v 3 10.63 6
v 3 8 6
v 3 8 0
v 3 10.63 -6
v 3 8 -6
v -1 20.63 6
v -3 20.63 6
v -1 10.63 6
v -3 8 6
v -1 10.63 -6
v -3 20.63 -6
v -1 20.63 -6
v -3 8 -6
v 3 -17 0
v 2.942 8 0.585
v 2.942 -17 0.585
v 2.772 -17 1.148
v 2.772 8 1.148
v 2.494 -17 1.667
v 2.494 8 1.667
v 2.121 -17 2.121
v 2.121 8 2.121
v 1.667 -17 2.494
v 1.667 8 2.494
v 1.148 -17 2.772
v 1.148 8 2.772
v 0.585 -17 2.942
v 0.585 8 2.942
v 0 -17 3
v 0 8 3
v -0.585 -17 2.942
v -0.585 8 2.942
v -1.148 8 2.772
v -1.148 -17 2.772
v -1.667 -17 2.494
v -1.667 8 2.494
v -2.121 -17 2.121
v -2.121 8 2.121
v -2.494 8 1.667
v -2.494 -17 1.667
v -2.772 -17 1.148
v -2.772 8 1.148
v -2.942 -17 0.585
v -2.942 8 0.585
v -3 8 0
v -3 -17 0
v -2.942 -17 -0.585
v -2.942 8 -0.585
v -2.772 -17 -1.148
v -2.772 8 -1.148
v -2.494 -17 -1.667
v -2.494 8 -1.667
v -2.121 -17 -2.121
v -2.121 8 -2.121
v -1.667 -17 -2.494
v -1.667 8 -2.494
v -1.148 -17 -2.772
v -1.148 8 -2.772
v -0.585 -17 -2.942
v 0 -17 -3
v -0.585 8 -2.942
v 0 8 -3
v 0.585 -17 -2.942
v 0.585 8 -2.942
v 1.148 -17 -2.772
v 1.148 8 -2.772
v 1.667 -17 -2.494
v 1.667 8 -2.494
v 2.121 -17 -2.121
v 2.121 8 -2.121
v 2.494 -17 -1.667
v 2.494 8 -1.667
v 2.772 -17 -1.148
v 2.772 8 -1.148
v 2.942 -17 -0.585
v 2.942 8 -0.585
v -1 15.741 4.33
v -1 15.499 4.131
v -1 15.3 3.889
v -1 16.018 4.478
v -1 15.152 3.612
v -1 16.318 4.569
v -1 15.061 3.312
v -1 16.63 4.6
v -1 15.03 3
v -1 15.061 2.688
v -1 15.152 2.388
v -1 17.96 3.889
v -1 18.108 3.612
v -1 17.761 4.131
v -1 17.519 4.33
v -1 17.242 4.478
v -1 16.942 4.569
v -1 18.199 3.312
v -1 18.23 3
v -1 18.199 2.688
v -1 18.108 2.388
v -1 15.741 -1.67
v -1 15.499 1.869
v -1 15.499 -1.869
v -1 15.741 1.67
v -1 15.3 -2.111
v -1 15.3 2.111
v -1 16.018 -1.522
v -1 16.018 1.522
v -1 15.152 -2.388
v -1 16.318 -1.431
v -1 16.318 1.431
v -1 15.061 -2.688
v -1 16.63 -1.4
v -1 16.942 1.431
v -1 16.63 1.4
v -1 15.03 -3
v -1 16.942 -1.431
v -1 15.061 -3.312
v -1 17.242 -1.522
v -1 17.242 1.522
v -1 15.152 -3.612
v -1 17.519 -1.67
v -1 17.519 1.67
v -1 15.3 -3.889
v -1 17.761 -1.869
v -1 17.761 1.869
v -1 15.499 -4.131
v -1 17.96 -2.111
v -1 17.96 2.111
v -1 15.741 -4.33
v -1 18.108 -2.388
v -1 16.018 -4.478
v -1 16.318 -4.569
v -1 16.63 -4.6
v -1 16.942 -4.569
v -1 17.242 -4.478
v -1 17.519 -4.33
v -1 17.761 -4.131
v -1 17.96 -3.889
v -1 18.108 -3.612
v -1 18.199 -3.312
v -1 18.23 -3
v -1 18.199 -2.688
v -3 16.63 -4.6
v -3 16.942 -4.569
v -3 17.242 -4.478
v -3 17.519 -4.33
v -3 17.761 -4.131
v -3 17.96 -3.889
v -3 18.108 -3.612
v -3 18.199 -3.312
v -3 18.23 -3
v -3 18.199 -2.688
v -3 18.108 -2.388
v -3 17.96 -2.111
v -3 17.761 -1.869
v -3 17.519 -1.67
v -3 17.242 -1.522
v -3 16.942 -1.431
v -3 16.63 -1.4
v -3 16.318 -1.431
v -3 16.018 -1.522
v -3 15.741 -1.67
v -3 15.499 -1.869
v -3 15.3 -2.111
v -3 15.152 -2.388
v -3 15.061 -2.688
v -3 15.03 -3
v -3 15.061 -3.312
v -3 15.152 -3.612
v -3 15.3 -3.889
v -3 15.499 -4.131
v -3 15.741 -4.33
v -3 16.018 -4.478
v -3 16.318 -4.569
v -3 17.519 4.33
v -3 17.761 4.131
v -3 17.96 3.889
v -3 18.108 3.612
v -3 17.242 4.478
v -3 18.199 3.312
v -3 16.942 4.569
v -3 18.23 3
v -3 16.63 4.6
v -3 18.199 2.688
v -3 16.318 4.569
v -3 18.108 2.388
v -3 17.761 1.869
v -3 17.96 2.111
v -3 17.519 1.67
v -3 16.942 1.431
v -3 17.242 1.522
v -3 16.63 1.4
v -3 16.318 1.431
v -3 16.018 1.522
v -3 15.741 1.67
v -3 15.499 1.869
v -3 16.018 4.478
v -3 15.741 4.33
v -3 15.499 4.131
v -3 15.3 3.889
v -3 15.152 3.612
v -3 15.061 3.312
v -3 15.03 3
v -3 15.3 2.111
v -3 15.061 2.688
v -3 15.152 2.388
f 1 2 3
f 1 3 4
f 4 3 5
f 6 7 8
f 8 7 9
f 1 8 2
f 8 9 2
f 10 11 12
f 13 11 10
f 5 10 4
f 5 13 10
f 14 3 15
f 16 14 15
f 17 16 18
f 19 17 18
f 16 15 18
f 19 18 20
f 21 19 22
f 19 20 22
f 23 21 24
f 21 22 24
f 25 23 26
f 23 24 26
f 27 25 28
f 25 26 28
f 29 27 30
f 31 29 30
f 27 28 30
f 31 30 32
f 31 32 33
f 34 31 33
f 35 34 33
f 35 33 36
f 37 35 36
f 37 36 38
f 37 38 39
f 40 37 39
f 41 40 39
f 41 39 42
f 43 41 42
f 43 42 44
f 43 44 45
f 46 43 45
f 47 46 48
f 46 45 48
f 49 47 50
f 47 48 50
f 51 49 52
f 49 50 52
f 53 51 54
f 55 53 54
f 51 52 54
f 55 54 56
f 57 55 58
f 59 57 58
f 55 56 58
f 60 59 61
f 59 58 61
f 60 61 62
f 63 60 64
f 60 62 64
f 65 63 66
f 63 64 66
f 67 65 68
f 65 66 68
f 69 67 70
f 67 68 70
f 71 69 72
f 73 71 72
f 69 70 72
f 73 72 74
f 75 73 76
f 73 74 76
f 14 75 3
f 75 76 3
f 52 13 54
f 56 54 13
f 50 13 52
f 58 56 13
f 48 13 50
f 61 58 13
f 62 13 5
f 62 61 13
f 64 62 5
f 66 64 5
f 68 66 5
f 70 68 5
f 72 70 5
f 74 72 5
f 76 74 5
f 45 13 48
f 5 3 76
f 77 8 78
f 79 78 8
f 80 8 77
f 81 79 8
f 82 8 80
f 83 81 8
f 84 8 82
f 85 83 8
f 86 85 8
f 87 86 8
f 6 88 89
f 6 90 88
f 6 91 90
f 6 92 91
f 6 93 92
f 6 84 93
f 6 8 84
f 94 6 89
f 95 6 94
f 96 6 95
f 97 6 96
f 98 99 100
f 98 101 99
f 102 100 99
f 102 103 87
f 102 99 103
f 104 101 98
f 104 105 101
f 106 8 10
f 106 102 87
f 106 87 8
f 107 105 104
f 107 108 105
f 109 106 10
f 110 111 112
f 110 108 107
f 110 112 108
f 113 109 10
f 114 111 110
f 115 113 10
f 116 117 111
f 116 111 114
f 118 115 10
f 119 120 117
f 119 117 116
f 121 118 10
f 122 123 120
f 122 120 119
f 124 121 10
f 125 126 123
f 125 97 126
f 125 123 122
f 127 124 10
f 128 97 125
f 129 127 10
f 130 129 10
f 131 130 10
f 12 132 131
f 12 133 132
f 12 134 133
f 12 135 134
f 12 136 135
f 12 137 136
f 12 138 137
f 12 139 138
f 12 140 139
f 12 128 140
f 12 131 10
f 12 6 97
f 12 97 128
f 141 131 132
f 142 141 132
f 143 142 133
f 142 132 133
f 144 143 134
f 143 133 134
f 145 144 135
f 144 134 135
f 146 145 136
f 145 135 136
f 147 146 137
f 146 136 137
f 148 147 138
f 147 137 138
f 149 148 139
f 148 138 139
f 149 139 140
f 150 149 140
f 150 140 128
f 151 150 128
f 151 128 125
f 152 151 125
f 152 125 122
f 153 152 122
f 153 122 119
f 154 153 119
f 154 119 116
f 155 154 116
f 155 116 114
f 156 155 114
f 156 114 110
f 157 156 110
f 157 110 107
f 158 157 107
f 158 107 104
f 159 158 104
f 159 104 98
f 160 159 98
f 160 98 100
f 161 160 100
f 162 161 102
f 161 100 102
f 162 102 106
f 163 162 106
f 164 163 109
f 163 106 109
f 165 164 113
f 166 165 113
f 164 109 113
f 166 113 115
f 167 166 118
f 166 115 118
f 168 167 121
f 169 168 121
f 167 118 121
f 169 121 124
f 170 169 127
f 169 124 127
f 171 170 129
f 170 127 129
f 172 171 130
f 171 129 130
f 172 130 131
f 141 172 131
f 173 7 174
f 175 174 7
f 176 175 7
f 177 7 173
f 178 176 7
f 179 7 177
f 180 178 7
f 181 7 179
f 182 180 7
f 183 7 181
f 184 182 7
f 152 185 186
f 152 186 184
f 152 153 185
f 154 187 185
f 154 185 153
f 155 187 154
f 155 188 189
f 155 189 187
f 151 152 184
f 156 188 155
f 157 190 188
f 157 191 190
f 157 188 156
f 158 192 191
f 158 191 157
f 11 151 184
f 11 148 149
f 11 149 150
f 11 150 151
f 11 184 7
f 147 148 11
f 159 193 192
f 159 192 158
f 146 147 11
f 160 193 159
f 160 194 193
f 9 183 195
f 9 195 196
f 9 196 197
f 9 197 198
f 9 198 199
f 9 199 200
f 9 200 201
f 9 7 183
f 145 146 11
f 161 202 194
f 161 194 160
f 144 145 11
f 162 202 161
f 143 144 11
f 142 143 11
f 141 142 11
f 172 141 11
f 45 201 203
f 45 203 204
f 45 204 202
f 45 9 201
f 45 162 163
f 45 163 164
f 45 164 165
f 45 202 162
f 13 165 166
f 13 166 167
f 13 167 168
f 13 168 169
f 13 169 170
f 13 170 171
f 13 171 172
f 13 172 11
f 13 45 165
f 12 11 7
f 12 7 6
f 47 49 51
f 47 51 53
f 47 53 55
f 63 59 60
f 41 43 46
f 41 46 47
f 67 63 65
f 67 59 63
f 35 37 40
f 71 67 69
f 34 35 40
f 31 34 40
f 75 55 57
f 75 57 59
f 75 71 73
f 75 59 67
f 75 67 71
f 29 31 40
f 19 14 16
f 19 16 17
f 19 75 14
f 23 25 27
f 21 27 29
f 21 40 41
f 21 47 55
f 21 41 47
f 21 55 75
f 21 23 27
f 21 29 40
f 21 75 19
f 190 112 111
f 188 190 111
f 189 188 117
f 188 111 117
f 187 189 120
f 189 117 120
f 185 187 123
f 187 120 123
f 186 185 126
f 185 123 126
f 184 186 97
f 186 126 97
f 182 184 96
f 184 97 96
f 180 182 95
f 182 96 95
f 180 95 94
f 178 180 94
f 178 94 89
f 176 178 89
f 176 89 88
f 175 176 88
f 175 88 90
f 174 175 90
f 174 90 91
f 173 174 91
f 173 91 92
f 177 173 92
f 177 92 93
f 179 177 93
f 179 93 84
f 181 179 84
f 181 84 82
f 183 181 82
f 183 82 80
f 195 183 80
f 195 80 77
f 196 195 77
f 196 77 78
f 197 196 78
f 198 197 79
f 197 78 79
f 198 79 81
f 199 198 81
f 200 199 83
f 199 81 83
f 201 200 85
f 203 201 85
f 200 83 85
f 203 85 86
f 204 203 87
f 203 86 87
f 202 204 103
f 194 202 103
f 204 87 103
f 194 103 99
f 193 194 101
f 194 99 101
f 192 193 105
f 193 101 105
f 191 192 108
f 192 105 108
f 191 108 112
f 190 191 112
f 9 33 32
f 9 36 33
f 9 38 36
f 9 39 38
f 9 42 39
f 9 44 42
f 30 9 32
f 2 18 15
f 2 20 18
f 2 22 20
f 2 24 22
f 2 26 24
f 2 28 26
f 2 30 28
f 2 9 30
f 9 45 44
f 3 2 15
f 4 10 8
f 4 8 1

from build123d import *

# Parameters (mm, degrees)
SKETCH_1_R          = 12.25
SKETCH_1_R_2        = 1.25
EXTRUDE_1_DEPTH     = 2
SKETCH_2_R          = 3
EXTRUDE_2_DEPTH     = 10.63
SKETCH_3_W          = 2
SKETCH_3_H          = 12
EXTRUDE_3_DEPTH     = 8
SKETCH_5_R          = 1.6
CUT_EXTRUDE_1_DEPTH = 10
SKETCH_6_W          = 6
SKETCH_6_H          = 12
EXTRUDE_4_DEPTH     = 10.63
SKETCH_7_W          = 4
SKETCH_7_H          = 12
CUT_EXTRUDE_2_DEPTH = 2
SKETCH_8_R          = 12.25
CUT_EXTRUDE_3_DEPTH = 8
SKETCH_9_R          = 3
EXTRUDE_5_DEPTH     = 25


with BuildPart() as part:
    # 草图1 → 凸台-拉伸1 (new body)
    with BuildSketch(Plane(origin=(0, 0, 0), x_dir=(1, 0, 0), z_dir=(0, 1, 0))):
        Circle(SKETCH_1_R)
        with Locations((8, 0)):
            Circle(SKETCH_1_R_2, mode=Mode.SUBTRACT)
        with Locations((0, -8)):
            Circle(SKETCH_1_R_2, mode=Mode.SUBTRACT)
        with Locations((-8, 0)):
            Circle(SKETCH_1_R_2, mode=Mode.SUBTRACT)
        with Locations((0, 8)):
            Circle(SKETCH_1_R_2, mode=Mode.SUBTRACT)
    extrude(amount=EXTRUDE_1_DEPTH)

    # 草图2 → 凸台-拉伸2 (add)
    with BuildSketch(Plane(origin=(0, 2, 0), x_dir=(1, 0, 0), z_dir=(0, 1, 0))):
        Circle(SKETCH_2_R)
    extrude(amount=EXTRUDE_2_DEPTH)

    # 草图3 → 凸台-拉伸3 (add)
    with BuildSketch(Plane(origin=(0, 12.63, 0), x_dir=(1, 0, 0), z_dir=(0, 1, 0))):
        with Locations((-2, 0)):
            Rectangle(SKETCH_3_W, SKETCH_3_H)
    extrude(amount=EXTRUDE_3_DEPTH)

    # 草图5 → 切除-拉伸1 (cut)
    with BuildSketch(Plane(origin=(-1, 0, 0), x_dir=(0, 0, -1), z_dir=(1, 0, 0))):
        with Locations((3, 16.63)):
            Circle(SKETCH_5_R)
        with Locations((-3, 16.63)):
            Circle(SKETCH_5_R)
    extrude(amount=-CUT_EXTRUDE_1_DEPTH, mode=Mode.SUBTRACT)

    # 草图6 → 凸台-拉伸4 (add)
    with BuildSketch(Plane(origin=(0, 2, 0), x_dir=(1, 0, 0), z_dir=(0, 1, 0))):
        Rectangle(SKETCH_6_W, SKETCH_6_H)
    extrude(amount=EXTRUDE_4_DEPTH)

    # 草图7 → 切除-拉伸2 (cut)
    with BuildSketch(Plane(origin=(0, 12.63, 0), x_dir=(1, 0, 0), z_dir=(0, 1, 0))):
        with Locations((1, 0)):
            Rectangle(SKETCH_7_W, SKETCH_7_H)
    extrude(amount=-CUT_EXTRUDE_2_DEPTH, mode=Mode.SUBTRACT)

    # 草图8 → 切除-拉伸3 (cut)
    with BuildSketch(Plane.XZ):
        Circle(SKETCH_8_R)
    extrude(amount=-CUT_EXTRUDE_3_DEPTH, mode=Mode.SUBTRACT)

    # 草图9 → 凸台-拉伸5 (add)
    with BuildSketch(Plane.XZ.offset(-8)):
        Circle(SKETCH_9_R)
    extrude(amount=EXTRUDE_5_DEPTH)


solid = part.part
